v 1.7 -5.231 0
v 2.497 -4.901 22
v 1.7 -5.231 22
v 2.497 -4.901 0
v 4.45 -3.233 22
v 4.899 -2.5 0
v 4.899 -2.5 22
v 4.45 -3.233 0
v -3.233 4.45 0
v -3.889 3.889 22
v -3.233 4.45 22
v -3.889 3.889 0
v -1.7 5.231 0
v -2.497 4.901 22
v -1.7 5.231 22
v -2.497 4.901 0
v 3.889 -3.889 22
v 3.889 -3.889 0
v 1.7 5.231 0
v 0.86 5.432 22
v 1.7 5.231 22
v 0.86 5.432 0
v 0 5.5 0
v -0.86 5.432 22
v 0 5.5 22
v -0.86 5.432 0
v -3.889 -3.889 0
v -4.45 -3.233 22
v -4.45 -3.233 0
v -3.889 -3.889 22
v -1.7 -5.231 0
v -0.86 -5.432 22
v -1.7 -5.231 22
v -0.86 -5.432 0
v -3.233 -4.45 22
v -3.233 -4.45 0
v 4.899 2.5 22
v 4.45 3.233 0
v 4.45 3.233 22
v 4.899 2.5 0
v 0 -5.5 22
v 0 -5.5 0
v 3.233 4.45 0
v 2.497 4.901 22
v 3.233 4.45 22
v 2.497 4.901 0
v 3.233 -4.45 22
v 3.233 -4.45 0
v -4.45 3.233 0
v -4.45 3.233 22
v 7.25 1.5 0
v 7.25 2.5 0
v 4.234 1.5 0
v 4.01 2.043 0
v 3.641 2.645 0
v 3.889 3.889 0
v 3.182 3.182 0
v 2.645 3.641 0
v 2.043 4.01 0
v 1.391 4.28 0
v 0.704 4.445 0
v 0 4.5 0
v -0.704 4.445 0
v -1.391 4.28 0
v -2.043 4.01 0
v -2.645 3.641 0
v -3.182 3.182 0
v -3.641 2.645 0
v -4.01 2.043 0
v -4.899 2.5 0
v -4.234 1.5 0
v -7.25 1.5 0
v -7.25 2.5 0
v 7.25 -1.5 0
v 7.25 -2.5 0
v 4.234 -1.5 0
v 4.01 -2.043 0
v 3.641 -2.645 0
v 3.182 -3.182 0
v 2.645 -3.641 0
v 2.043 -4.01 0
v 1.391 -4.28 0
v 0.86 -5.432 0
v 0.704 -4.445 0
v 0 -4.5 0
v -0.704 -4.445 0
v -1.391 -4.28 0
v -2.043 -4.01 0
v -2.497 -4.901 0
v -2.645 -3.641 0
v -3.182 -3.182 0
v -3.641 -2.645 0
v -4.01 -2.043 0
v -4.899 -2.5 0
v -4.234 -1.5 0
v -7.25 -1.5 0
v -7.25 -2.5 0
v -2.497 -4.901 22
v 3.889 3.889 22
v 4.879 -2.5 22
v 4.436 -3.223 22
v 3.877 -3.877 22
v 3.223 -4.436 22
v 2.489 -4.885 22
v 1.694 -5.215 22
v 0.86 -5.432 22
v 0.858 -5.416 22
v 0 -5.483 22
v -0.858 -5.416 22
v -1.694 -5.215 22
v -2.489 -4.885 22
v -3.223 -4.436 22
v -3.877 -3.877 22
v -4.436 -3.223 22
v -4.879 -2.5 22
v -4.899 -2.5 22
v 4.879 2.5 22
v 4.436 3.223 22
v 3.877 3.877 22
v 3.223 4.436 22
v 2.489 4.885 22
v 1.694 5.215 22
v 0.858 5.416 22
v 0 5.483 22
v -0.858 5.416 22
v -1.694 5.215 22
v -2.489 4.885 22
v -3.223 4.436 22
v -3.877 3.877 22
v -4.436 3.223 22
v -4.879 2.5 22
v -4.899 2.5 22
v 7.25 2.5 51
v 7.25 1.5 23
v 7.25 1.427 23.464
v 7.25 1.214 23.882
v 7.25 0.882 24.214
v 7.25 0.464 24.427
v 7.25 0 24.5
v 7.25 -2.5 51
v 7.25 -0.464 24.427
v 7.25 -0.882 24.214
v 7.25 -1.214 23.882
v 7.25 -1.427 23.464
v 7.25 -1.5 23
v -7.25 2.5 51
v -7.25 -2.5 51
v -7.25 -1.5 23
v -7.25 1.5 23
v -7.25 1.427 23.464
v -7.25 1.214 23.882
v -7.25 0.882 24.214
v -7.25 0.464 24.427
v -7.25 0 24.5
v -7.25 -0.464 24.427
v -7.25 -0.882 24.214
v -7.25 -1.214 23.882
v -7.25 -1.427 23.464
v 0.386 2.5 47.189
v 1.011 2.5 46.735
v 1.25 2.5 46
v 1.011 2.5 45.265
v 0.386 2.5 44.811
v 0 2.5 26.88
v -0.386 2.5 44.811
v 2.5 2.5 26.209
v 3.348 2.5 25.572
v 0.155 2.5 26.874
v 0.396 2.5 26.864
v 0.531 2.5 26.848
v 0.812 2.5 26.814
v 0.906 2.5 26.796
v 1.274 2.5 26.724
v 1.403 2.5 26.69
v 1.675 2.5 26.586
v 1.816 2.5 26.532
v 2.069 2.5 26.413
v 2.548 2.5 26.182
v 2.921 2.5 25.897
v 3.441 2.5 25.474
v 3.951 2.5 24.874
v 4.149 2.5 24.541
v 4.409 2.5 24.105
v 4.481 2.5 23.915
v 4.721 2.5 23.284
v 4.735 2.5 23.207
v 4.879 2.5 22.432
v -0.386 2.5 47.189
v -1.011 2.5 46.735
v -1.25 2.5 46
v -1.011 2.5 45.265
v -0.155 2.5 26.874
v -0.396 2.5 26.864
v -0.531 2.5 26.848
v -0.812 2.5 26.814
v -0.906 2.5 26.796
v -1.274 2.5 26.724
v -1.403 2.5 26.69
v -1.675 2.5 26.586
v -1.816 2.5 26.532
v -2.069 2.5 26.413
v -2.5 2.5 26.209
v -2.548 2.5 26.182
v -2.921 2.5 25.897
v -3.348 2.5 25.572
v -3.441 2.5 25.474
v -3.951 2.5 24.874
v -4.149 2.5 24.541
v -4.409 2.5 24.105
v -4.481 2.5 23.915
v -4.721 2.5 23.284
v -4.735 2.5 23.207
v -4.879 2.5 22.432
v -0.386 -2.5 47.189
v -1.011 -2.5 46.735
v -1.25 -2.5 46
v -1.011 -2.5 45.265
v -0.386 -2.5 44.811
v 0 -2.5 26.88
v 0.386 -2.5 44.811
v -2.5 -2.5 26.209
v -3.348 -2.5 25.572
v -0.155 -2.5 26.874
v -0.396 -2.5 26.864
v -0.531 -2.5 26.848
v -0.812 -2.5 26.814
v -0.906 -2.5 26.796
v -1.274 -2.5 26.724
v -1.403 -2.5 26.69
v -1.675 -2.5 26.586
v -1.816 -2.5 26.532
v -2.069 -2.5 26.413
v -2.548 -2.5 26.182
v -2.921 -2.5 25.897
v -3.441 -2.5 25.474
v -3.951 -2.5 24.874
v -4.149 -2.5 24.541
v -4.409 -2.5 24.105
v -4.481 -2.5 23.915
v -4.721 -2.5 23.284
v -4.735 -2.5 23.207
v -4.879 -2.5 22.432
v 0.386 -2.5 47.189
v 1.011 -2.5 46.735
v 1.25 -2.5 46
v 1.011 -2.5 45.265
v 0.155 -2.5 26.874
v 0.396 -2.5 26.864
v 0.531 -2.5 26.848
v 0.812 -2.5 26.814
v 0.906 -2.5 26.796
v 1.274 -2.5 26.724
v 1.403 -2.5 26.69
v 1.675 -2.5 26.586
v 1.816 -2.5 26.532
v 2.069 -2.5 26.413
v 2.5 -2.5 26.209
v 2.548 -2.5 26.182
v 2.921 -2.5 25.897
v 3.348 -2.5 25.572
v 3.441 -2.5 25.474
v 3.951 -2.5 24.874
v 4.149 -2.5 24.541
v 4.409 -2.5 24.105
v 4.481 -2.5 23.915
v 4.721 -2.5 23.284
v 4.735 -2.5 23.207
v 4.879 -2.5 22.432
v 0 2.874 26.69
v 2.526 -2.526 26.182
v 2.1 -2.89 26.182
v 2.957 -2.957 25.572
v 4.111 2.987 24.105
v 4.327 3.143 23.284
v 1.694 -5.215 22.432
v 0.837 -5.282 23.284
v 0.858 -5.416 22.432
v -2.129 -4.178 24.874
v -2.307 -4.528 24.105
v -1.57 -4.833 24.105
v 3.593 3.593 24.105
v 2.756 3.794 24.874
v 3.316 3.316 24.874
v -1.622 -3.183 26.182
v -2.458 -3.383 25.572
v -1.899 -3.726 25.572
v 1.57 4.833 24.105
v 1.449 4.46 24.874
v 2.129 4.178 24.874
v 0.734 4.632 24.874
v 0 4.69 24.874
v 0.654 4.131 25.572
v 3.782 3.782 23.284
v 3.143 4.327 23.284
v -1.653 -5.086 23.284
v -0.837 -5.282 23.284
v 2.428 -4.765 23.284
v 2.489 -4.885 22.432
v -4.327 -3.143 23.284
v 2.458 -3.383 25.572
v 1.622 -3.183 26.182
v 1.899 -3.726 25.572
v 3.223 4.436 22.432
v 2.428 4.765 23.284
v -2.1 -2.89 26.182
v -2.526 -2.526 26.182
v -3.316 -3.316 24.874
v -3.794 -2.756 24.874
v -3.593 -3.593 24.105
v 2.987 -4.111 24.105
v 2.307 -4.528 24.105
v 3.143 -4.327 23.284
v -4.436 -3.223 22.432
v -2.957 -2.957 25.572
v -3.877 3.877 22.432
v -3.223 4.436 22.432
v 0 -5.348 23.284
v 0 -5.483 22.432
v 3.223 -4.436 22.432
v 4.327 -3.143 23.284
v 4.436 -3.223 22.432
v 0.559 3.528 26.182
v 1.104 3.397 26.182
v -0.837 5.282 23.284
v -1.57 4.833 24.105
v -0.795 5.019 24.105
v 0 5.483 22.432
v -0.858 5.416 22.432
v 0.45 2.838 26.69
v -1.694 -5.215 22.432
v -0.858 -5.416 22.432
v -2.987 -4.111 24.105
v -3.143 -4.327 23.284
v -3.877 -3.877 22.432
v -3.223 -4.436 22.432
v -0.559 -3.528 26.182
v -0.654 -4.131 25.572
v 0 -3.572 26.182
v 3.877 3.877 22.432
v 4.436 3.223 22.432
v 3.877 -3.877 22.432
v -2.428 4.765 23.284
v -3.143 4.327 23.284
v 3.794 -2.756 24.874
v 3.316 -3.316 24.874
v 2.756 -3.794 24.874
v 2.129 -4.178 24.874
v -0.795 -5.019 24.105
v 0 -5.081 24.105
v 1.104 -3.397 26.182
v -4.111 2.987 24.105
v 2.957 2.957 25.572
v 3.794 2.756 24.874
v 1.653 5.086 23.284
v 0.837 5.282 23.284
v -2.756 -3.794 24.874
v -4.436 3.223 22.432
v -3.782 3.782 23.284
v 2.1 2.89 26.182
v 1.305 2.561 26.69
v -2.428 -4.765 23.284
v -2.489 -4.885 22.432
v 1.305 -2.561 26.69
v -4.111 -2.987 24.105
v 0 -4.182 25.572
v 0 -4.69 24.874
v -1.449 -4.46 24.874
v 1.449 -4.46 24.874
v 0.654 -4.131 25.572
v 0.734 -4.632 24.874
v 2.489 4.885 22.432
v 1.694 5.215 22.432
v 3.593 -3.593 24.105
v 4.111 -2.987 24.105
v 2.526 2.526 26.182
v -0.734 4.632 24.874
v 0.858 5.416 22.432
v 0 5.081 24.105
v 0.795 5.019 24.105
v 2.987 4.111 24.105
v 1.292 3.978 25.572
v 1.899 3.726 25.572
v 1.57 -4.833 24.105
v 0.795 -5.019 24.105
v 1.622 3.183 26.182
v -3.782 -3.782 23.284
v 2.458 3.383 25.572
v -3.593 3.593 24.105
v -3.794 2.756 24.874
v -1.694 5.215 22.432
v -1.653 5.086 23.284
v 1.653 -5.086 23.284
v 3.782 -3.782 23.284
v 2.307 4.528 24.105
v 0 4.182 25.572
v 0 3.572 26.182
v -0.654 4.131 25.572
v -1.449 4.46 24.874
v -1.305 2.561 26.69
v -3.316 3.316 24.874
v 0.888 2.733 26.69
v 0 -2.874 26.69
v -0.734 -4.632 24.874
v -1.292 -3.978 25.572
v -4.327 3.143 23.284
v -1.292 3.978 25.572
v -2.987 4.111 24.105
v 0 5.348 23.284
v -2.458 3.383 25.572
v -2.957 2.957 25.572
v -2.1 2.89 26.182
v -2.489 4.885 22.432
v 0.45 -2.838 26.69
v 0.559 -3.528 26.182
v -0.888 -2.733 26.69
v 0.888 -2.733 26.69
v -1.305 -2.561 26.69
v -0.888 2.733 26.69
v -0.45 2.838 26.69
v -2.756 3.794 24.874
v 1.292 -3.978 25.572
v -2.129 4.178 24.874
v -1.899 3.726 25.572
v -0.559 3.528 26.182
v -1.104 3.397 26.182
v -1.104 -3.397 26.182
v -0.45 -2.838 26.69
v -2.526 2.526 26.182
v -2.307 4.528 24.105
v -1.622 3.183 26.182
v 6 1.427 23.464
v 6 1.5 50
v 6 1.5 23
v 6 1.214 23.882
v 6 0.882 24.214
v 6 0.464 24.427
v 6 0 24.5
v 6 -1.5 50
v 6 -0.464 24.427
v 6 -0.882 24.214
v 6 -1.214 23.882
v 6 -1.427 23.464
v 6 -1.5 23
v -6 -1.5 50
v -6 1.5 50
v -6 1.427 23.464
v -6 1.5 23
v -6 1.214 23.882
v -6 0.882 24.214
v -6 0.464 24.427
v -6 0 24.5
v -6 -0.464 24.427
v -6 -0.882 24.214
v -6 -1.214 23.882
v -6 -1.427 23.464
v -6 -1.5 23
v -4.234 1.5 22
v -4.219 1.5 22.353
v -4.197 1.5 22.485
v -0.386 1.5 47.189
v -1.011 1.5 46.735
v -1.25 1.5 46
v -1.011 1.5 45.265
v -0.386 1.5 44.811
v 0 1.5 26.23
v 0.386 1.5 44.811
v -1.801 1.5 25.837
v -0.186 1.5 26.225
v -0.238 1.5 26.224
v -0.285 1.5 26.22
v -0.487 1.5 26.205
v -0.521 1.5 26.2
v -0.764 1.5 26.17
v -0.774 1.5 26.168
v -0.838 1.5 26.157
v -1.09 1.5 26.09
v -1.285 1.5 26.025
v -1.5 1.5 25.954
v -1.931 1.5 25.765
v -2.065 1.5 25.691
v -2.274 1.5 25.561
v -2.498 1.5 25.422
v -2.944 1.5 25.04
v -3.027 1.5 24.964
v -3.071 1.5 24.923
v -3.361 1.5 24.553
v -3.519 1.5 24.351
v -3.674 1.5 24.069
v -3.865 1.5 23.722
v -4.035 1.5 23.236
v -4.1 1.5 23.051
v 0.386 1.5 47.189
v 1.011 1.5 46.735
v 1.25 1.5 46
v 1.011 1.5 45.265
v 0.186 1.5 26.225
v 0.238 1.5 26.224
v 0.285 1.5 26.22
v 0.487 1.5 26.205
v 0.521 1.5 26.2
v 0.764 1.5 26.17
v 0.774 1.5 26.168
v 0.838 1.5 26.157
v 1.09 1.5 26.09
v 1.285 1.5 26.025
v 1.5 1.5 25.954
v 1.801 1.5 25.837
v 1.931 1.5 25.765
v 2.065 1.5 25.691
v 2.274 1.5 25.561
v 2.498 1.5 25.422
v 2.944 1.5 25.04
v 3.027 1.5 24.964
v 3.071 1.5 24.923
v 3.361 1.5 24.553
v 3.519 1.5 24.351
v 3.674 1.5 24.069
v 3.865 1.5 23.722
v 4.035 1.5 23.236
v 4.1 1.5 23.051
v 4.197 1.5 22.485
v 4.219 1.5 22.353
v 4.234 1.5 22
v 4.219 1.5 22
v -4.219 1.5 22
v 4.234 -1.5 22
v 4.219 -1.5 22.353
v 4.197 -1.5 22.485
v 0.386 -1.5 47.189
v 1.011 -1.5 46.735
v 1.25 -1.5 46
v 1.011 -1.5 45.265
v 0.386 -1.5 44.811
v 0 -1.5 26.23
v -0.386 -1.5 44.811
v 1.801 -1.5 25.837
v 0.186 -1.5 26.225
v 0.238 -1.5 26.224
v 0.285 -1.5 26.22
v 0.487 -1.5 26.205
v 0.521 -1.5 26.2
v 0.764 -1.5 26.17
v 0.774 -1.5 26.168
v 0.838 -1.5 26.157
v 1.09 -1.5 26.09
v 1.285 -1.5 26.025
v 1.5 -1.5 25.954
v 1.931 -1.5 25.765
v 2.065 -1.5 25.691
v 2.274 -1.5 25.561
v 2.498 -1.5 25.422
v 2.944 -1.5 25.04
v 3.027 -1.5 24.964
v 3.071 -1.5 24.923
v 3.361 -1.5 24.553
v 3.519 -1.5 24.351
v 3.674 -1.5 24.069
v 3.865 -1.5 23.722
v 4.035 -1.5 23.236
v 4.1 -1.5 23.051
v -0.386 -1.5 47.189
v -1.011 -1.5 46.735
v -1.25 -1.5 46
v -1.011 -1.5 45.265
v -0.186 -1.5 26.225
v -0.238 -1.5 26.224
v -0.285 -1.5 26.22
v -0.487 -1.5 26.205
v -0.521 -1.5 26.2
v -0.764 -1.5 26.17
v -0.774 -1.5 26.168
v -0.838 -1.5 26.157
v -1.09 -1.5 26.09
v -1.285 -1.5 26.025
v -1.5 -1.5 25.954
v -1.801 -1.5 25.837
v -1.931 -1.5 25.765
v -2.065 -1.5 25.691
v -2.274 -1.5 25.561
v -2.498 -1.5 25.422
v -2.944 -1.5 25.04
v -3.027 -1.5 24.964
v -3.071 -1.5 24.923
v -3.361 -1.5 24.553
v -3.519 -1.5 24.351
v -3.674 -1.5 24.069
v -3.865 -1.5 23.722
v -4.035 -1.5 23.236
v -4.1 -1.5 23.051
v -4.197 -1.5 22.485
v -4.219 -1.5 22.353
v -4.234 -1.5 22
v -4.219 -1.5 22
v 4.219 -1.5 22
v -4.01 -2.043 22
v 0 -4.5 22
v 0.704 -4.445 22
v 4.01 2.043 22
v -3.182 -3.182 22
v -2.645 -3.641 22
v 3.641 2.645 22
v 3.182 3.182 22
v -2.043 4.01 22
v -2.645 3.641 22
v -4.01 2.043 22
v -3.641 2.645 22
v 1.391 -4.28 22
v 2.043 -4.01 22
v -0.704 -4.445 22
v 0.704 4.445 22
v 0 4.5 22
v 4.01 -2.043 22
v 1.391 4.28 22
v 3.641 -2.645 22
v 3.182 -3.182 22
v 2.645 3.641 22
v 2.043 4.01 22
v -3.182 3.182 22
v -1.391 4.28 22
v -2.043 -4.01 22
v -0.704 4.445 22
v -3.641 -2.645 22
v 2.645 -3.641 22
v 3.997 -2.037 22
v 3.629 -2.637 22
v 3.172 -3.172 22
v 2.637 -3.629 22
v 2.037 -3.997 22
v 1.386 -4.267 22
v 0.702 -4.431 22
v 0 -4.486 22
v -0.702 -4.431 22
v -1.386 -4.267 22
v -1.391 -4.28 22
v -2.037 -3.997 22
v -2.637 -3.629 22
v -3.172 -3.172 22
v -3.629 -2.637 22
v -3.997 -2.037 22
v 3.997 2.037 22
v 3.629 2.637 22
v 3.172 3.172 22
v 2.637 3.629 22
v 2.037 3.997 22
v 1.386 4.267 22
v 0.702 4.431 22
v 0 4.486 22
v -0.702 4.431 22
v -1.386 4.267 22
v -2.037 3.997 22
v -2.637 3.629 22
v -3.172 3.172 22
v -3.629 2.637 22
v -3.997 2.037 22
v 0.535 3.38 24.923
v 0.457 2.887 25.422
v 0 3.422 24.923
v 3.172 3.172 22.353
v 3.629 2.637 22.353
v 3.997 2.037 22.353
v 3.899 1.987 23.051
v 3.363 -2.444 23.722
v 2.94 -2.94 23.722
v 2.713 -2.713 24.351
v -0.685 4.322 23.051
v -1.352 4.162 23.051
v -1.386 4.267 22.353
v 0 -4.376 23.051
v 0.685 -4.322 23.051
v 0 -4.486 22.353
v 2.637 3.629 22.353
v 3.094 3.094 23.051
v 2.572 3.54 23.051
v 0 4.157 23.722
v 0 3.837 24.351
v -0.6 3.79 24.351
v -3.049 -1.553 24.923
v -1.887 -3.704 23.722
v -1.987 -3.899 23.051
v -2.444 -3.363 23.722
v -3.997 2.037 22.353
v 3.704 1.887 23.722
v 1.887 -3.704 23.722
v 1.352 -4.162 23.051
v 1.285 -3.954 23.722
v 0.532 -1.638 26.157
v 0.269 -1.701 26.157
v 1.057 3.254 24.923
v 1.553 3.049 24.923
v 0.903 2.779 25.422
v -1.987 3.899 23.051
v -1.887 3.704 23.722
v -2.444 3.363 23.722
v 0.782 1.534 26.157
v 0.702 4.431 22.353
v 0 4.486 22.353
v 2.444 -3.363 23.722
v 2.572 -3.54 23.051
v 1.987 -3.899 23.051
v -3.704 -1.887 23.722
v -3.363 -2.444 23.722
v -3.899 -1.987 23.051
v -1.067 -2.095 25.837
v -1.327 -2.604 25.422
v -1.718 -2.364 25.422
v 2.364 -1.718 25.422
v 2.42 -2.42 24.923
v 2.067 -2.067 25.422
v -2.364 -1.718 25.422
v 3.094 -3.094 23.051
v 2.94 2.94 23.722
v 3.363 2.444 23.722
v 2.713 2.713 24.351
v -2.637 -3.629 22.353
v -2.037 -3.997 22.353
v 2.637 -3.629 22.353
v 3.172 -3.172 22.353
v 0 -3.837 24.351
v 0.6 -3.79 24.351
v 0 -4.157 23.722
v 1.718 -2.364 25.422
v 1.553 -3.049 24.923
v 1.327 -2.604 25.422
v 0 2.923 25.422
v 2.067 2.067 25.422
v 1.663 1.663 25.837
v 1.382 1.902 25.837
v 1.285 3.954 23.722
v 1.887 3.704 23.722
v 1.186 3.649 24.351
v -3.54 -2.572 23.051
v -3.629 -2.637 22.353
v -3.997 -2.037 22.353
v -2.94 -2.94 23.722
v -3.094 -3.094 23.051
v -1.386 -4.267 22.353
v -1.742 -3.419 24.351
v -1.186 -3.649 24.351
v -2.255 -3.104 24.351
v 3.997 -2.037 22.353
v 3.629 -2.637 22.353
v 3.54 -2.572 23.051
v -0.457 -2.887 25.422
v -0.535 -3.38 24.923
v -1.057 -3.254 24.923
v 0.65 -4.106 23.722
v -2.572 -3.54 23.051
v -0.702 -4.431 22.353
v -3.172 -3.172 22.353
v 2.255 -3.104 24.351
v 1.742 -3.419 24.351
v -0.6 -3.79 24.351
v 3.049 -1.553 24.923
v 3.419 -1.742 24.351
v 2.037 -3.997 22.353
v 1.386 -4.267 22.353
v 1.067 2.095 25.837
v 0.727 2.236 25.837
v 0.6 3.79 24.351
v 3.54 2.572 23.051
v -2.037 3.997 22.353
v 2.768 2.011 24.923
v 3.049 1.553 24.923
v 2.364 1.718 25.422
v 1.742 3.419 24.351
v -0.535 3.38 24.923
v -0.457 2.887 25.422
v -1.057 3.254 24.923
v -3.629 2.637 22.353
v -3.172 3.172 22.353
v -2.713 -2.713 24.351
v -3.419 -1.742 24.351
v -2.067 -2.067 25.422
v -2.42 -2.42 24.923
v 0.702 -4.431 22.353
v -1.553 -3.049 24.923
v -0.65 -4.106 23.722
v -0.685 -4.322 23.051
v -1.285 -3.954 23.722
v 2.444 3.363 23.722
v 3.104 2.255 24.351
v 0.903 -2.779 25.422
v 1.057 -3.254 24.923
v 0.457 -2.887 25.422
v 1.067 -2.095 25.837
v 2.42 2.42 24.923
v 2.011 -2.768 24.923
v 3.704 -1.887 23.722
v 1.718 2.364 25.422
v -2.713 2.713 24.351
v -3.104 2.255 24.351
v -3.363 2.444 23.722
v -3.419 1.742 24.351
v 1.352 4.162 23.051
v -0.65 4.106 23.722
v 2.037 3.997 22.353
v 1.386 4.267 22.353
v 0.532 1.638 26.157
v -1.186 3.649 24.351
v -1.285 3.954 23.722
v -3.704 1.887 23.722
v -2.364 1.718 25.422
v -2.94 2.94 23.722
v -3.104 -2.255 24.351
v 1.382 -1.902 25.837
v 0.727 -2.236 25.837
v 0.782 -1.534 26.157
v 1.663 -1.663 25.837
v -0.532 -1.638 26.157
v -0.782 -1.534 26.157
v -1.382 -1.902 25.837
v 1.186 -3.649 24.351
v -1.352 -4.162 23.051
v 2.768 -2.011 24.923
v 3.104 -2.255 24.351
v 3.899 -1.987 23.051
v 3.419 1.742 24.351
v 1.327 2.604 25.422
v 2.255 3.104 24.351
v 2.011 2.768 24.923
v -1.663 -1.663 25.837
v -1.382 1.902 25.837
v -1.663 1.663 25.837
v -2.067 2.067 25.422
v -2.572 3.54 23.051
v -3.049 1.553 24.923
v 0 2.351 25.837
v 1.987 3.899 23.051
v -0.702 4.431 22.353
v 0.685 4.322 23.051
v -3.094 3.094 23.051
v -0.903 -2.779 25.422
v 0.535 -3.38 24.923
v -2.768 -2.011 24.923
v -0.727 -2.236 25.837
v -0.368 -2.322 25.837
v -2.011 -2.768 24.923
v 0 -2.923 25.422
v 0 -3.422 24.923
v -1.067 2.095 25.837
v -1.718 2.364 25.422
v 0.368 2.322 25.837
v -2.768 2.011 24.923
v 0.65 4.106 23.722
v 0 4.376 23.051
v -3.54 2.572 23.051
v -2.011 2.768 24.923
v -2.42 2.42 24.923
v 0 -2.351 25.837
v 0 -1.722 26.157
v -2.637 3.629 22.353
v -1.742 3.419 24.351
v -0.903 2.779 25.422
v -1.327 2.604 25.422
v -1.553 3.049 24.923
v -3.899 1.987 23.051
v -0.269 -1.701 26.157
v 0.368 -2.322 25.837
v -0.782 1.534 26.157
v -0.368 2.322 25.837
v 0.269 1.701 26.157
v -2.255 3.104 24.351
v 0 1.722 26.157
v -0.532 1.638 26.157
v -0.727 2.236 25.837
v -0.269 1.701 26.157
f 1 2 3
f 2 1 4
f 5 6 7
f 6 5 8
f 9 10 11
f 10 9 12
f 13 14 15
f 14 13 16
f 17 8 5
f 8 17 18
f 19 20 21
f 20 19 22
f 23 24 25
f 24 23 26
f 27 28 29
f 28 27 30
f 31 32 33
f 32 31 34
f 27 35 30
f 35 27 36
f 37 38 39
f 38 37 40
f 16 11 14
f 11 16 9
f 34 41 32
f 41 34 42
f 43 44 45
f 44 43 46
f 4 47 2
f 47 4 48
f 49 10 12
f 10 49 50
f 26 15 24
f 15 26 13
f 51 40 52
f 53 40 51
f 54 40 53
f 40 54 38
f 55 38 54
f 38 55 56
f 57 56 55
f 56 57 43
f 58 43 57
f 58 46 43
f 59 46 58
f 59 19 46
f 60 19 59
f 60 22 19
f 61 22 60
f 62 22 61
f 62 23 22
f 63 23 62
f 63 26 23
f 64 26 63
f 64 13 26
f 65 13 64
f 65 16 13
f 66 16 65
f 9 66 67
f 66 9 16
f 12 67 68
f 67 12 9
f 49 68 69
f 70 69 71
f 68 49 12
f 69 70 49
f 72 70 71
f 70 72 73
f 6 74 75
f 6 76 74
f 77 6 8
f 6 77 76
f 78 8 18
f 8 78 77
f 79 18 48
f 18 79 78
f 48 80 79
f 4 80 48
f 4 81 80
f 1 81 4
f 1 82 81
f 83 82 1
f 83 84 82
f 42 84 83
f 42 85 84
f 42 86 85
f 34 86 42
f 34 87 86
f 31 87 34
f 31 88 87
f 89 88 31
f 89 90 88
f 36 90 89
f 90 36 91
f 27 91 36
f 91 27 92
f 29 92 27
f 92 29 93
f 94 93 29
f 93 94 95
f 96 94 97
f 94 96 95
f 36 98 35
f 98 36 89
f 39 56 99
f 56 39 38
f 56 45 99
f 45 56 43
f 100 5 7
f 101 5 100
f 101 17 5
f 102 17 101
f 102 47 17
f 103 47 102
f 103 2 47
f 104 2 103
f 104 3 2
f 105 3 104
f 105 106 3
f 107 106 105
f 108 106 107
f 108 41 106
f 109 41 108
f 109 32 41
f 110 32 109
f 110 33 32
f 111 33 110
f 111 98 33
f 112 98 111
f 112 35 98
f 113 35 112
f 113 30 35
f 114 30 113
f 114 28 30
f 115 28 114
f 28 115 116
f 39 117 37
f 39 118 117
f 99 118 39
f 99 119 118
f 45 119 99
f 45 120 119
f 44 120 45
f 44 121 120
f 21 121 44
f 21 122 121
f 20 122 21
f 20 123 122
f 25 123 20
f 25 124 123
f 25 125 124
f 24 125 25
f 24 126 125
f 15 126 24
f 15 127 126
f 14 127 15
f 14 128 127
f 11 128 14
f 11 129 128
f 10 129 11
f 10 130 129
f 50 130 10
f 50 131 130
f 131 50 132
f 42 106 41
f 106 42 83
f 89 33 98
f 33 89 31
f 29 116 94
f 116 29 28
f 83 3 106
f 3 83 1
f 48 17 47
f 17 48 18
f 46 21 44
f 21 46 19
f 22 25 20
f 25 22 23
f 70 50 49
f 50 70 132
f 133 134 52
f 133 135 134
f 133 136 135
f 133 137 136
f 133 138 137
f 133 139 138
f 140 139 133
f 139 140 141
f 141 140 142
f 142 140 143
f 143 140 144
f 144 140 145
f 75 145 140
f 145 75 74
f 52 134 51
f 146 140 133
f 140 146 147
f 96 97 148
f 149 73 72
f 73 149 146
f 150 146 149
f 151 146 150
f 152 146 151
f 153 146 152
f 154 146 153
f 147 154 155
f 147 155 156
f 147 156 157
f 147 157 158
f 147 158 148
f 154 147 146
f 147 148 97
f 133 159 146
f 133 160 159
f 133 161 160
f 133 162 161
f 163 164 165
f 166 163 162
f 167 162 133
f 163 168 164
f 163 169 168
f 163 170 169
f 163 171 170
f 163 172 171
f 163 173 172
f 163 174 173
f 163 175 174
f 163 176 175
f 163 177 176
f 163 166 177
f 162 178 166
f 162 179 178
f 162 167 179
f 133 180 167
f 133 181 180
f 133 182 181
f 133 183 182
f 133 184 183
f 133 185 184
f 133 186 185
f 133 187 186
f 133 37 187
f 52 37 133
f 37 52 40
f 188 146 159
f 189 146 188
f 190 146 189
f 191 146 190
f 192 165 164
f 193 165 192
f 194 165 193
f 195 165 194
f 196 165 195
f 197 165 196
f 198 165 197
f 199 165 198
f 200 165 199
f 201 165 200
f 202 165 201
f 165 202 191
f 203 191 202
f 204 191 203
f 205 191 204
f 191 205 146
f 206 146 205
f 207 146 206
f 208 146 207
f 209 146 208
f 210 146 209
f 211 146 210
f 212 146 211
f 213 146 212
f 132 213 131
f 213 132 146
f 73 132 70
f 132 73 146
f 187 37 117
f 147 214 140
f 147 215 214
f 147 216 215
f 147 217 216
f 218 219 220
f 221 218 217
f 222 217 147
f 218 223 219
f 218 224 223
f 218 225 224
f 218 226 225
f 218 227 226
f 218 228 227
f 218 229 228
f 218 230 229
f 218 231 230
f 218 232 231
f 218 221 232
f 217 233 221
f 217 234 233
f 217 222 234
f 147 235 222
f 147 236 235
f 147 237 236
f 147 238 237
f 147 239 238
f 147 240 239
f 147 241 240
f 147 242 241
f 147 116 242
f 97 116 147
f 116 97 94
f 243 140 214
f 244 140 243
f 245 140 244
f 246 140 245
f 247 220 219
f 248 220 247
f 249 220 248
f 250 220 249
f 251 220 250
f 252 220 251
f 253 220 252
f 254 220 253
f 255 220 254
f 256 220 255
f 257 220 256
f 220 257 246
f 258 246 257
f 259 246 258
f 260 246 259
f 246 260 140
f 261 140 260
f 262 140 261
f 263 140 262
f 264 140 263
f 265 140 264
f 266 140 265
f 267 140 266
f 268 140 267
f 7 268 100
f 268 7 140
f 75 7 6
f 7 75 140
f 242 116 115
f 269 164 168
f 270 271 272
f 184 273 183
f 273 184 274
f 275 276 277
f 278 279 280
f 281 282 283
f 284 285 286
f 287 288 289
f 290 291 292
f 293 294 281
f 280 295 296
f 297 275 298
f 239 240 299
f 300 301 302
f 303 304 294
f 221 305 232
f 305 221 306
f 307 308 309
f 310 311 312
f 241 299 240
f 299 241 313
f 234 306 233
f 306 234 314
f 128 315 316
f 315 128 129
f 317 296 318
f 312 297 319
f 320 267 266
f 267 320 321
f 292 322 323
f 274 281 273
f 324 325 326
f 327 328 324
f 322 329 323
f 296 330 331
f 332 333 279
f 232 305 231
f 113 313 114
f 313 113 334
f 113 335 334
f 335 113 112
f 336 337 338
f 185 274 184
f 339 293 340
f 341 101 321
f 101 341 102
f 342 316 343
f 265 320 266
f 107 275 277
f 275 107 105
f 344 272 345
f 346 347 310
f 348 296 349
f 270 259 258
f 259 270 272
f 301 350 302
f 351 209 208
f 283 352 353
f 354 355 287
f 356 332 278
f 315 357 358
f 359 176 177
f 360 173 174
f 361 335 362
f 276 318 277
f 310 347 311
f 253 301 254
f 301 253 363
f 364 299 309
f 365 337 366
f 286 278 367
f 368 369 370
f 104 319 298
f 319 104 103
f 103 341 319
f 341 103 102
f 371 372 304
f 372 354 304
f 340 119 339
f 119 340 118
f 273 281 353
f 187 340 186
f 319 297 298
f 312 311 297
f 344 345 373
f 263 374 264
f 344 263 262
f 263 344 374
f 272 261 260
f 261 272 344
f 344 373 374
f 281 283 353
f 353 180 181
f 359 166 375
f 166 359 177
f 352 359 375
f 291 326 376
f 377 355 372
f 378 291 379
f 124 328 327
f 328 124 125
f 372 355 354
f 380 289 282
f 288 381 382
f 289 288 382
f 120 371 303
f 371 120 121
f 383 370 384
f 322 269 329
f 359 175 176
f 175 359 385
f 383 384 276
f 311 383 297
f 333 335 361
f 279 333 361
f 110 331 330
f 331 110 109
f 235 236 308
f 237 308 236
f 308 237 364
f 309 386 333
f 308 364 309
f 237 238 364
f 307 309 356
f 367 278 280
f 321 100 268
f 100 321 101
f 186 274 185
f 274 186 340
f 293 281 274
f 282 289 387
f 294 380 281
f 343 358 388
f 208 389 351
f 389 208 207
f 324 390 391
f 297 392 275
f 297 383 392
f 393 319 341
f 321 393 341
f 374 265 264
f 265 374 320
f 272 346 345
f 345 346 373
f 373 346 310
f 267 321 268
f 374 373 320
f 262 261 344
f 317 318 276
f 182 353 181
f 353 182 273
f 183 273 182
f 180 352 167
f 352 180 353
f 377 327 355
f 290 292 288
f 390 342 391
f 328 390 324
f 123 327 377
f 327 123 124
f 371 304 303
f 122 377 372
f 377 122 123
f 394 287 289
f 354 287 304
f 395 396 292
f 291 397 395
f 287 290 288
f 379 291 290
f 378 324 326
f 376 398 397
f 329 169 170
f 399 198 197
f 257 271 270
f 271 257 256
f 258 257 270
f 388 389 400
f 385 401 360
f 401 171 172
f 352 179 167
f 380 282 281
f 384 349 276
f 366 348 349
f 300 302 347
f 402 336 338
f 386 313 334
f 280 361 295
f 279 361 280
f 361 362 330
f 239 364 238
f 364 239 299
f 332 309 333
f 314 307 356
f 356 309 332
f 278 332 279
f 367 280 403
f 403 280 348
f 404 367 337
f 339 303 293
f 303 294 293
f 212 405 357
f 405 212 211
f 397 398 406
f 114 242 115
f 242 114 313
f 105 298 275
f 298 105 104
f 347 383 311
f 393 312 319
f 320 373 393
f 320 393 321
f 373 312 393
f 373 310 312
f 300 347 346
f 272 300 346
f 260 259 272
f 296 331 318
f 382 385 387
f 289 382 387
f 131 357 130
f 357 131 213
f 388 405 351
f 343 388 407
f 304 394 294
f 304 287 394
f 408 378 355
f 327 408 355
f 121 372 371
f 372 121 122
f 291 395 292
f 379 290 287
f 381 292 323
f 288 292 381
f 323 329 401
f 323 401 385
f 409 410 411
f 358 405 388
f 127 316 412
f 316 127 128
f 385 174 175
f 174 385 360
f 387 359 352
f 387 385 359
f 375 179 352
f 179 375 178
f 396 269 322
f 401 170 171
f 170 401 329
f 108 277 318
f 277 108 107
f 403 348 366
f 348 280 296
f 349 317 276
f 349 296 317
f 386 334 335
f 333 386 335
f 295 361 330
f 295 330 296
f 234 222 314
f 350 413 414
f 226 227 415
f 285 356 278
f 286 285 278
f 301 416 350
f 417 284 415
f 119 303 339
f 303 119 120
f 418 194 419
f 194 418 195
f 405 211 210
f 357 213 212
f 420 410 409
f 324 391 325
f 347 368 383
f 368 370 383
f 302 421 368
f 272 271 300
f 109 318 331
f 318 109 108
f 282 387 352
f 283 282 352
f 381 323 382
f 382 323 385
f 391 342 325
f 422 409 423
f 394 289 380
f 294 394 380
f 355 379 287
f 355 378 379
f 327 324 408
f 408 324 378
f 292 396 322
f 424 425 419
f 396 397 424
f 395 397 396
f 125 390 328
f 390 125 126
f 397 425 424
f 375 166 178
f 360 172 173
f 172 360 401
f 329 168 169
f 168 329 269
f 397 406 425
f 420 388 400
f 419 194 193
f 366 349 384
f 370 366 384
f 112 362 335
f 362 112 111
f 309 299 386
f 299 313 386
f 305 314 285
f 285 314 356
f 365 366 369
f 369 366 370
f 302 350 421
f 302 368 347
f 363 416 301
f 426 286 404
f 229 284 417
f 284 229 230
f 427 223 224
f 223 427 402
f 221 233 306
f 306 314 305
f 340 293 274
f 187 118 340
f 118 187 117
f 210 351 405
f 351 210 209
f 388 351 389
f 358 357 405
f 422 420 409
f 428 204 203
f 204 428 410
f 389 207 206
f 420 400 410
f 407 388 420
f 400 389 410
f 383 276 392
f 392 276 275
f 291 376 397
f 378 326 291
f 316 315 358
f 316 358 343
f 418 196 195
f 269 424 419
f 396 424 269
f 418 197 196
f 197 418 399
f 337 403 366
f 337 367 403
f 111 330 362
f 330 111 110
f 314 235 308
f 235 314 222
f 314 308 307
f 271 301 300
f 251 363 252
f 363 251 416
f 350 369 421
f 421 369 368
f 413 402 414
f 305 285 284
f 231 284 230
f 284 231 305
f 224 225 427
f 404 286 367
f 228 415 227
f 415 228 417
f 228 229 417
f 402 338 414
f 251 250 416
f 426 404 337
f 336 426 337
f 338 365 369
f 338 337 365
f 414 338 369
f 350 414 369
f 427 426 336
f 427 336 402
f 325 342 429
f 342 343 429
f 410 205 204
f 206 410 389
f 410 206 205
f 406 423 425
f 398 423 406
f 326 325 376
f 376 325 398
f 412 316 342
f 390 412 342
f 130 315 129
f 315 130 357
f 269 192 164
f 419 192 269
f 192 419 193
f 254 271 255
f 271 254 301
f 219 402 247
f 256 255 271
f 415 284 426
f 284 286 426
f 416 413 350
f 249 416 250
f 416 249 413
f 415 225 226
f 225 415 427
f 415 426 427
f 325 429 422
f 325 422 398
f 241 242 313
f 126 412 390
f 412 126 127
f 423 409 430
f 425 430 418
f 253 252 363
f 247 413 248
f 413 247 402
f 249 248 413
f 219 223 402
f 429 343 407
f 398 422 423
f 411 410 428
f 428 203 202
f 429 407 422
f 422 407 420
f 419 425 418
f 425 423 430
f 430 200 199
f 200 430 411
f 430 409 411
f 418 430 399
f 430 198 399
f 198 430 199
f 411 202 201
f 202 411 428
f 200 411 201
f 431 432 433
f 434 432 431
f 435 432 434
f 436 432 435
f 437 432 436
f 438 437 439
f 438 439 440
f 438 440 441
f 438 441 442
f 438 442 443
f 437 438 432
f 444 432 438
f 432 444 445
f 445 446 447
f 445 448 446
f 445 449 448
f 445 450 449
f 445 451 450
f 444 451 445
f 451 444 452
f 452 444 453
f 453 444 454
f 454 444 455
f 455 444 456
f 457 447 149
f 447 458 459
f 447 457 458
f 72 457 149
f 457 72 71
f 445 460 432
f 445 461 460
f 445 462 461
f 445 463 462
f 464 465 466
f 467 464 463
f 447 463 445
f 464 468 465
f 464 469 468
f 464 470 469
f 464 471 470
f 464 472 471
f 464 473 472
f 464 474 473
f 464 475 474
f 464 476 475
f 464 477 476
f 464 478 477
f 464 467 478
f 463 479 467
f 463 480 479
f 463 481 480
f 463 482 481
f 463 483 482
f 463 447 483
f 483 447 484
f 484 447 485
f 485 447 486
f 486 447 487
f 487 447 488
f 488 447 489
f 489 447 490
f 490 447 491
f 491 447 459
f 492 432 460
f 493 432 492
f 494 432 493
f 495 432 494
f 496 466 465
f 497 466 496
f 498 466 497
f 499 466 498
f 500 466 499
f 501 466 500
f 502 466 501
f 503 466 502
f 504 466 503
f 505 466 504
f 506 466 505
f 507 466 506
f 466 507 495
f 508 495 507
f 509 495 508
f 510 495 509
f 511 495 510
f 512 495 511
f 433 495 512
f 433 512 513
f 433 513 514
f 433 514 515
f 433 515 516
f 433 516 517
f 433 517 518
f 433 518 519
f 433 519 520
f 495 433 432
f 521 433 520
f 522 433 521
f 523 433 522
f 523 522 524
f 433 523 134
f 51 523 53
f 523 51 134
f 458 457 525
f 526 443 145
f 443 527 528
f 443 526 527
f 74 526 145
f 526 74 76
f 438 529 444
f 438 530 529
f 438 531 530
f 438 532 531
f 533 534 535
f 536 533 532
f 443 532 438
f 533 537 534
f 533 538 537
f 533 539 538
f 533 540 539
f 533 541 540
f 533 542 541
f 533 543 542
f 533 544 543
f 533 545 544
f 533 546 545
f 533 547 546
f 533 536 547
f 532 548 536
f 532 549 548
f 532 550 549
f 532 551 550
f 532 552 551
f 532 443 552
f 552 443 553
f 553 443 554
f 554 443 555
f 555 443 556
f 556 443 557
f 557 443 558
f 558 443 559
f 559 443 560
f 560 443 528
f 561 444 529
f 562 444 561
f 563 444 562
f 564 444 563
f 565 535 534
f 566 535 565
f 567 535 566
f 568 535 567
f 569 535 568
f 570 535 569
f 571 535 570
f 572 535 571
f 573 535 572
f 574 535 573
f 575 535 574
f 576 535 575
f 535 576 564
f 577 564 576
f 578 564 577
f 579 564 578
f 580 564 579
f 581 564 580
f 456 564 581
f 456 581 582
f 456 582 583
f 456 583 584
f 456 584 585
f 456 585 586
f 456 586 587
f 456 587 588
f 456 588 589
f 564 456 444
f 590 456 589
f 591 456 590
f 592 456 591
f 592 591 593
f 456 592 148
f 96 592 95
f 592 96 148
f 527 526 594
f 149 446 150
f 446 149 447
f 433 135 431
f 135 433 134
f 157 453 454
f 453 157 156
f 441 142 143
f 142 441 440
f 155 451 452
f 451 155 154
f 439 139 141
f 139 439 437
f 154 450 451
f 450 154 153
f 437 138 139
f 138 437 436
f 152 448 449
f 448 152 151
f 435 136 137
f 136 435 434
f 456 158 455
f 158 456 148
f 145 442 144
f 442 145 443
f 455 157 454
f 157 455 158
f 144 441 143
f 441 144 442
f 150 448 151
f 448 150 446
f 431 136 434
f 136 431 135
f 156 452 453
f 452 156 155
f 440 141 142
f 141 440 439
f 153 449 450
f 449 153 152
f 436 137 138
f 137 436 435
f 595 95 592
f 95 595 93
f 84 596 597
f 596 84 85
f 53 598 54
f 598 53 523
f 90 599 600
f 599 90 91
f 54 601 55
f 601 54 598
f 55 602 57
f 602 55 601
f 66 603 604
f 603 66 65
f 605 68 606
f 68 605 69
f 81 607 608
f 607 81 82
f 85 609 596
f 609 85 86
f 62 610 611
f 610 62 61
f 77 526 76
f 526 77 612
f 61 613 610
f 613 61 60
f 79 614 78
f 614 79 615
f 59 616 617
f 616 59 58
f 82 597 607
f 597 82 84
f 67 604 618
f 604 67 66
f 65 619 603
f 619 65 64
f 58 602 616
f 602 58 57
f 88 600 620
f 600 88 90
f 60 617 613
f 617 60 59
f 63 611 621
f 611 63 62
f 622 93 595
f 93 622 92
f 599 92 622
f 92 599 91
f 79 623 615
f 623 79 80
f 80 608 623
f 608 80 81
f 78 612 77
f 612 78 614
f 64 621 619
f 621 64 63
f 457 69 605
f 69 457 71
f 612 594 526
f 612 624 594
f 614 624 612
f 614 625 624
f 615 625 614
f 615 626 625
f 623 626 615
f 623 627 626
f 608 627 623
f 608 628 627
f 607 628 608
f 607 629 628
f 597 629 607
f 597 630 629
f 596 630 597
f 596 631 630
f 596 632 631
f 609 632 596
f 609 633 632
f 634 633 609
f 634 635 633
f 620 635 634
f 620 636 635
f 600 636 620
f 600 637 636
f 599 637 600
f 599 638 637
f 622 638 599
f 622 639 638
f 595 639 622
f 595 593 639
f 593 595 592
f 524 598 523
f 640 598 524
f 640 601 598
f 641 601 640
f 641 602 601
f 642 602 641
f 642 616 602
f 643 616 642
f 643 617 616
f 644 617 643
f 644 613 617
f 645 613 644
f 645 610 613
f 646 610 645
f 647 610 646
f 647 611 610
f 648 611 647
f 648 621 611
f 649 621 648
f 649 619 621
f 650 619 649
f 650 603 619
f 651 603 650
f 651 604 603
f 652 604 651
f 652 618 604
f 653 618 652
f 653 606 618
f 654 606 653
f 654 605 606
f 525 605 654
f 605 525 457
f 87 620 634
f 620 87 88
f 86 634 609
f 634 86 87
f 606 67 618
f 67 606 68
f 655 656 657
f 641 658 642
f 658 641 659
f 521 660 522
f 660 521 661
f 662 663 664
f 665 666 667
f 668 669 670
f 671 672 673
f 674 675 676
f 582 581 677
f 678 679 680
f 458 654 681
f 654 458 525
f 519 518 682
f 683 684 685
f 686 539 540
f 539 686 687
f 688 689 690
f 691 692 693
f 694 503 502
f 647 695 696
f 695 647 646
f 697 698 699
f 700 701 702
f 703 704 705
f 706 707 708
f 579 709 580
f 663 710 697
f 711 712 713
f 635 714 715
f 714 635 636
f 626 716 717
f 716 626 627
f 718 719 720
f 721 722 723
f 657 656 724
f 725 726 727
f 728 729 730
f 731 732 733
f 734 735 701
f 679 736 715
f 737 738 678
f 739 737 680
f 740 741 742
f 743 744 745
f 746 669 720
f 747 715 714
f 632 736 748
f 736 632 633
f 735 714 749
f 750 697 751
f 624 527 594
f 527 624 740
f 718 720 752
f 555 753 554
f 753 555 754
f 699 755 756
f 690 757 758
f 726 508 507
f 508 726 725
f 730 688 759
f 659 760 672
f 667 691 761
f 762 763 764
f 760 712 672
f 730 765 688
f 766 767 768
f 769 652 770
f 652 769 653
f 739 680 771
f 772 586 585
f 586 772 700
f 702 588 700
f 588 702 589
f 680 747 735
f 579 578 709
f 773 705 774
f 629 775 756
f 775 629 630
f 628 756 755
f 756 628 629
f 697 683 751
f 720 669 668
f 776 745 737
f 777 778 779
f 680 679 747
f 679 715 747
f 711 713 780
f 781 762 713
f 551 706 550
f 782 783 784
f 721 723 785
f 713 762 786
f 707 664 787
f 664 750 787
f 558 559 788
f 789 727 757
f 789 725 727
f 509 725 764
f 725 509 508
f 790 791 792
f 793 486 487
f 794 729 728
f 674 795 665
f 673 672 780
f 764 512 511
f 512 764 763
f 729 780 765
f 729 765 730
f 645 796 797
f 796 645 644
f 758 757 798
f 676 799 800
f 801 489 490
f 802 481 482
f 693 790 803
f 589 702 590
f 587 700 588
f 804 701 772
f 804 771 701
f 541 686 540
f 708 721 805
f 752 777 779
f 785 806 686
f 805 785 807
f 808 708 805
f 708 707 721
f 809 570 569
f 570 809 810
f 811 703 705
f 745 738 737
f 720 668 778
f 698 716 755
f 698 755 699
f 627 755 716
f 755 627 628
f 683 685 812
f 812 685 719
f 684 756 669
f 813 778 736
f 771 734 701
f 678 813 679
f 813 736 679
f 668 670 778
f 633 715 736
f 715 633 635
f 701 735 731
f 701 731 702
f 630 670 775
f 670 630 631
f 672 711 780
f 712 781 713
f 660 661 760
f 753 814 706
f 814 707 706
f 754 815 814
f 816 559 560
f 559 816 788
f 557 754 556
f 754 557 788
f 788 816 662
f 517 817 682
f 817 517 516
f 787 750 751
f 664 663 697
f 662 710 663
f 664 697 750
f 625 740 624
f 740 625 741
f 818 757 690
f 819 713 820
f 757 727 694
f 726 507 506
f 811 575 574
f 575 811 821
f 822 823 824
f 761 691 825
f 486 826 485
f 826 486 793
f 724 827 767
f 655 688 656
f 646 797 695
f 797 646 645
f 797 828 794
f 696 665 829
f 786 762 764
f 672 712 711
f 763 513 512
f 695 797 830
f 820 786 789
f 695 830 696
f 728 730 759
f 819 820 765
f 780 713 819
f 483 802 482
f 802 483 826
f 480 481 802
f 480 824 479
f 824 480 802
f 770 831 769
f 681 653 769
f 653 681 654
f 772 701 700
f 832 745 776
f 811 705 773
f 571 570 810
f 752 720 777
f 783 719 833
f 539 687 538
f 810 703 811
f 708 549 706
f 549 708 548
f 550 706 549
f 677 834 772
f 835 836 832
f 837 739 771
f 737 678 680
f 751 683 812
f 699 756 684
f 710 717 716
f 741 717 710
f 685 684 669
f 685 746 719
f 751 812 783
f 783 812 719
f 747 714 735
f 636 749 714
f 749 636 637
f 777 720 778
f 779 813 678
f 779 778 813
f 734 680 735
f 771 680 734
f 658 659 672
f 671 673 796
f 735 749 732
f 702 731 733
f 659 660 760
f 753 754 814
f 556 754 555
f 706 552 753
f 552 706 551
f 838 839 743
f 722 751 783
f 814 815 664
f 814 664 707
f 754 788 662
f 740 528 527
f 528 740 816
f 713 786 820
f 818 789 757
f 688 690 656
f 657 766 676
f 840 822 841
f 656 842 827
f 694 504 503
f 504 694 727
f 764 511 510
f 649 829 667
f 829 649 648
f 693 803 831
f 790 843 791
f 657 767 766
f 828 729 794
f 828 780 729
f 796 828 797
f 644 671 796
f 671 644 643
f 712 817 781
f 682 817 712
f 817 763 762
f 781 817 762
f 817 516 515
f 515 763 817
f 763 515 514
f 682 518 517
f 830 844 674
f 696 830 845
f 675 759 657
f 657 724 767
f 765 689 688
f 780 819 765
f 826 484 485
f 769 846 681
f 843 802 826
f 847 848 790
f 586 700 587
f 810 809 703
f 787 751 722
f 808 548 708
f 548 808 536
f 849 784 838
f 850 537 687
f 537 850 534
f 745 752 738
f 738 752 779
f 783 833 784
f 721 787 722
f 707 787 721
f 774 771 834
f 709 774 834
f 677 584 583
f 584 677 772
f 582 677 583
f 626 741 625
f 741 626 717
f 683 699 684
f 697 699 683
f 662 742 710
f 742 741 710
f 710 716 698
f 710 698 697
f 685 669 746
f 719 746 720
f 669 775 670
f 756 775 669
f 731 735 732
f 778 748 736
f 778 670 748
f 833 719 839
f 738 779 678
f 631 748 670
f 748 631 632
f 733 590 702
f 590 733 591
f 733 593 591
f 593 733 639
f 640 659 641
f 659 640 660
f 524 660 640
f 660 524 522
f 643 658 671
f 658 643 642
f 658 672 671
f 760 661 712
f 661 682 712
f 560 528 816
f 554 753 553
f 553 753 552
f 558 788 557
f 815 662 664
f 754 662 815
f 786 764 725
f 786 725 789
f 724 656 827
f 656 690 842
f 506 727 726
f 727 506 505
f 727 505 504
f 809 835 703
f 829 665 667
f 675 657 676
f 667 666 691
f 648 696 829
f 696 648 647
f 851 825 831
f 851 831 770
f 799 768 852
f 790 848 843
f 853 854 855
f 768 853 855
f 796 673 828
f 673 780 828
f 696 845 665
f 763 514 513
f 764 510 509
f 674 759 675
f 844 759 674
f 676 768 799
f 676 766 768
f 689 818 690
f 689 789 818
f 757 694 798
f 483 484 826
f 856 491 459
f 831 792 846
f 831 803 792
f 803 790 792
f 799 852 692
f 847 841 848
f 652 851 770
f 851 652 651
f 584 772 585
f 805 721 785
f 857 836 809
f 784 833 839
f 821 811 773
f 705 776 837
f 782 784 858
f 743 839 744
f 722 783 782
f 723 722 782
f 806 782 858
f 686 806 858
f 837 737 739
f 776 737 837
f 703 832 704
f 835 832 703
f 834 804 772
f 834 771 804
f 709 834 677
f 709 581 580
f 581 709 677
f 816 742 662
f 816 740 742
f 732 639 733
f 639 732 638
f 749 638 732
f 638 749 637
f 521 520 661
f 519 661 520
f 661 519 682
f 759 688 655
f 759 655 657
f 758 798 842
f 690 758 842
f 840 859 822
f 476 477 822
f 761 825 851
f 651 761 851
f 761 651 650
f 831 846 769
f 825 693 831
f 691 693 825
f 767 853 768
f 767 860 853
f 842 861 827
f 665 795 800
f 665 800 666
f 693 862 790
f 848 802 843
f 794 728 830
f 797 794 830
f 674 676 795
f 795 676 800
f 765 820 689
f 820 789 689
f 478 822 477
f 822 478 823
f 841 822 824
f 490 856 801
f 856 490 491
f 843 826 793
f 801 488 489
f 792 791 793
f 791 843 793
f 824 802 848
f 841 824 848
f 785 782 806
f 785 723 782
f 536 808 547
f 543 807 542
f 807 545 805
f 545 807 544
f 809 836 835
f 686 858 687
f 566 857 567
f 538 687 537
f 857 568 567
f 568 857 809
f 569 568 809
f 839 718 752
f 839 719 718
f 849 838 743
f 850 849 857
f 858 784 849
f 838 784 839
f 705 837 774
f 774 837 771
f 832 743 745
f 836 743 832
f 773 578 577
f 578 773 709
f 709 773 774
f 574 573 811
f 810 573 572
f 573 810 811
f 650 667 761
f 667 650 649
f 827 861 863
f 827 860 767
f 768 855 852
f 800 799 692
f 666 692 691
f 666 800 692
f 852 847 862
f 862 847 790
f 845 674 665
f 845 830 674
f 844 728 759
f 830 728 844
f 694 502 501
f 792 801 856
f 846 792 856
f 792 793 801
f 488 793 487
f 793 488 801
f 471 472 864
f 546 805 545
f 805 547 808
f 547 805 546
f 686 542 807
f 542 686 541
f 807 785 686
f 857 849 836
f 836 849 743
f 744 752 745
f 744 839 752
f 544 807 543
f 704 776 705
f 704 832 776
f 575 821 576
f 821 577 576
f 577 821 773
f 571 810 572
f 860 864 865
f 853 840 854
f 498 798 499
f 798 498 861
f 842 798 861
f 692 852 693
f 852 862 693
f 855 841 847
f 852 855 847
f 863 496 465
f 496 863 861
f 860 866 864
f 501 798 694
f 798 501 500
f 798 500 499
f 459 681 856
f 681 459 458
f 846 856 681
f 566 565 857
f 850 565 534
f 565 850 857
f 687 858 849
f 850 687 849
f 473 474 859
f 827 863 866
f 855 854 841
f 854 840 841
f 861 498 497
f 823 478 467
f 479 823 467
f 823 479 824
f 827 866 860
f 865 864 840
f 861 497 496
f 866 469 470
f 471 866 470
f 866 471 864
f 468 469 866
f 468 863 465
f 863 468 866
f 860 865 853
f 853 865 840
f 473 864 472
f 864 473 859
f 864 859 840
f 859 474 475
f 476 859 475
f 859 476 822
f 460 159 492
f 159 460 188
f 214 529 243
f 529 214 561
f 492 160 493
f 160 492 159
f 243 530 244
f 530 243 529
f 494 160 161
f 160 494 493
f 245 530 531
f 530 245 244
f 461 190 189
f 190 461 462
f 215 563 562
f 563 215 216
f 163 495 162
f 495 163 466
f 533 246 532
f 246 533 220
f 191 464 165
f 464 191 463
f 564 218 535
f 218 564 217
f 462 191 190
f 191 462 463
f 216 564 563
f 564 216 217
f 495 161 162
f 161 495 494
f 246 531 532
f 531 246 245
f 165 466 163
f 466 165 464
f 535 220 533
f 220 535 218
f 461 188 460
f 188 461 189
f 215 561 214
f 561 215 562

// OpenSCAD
difference() {
	union() {
		cylinder(h=22,r=5.5, $fn=40);
		translate([0,0,25.5])
			cube([14.5,5,51], center=true);
		translate([0,0,22])
			sphere(r=5.5, $fn=40);
	}
	translate([-6,-1.5,0]) cube([12,3,50]);

	translate([-7.25,-1.5,0]) cube([14.5,3,23]);
	translate([-7.5,0,23]) rotate([0,90,0])
		cylinder(h=15,r=1.5,$fn=20);

	cylinder(h=22,r=4.5, $fn=40);
	translate([0,0,22]) sphere(r=4.5, $fn=40);

	translate([0,3,46]) rotate([90,0,0])
		cylinder(h=6,r=1.25,$fn=10);
}
